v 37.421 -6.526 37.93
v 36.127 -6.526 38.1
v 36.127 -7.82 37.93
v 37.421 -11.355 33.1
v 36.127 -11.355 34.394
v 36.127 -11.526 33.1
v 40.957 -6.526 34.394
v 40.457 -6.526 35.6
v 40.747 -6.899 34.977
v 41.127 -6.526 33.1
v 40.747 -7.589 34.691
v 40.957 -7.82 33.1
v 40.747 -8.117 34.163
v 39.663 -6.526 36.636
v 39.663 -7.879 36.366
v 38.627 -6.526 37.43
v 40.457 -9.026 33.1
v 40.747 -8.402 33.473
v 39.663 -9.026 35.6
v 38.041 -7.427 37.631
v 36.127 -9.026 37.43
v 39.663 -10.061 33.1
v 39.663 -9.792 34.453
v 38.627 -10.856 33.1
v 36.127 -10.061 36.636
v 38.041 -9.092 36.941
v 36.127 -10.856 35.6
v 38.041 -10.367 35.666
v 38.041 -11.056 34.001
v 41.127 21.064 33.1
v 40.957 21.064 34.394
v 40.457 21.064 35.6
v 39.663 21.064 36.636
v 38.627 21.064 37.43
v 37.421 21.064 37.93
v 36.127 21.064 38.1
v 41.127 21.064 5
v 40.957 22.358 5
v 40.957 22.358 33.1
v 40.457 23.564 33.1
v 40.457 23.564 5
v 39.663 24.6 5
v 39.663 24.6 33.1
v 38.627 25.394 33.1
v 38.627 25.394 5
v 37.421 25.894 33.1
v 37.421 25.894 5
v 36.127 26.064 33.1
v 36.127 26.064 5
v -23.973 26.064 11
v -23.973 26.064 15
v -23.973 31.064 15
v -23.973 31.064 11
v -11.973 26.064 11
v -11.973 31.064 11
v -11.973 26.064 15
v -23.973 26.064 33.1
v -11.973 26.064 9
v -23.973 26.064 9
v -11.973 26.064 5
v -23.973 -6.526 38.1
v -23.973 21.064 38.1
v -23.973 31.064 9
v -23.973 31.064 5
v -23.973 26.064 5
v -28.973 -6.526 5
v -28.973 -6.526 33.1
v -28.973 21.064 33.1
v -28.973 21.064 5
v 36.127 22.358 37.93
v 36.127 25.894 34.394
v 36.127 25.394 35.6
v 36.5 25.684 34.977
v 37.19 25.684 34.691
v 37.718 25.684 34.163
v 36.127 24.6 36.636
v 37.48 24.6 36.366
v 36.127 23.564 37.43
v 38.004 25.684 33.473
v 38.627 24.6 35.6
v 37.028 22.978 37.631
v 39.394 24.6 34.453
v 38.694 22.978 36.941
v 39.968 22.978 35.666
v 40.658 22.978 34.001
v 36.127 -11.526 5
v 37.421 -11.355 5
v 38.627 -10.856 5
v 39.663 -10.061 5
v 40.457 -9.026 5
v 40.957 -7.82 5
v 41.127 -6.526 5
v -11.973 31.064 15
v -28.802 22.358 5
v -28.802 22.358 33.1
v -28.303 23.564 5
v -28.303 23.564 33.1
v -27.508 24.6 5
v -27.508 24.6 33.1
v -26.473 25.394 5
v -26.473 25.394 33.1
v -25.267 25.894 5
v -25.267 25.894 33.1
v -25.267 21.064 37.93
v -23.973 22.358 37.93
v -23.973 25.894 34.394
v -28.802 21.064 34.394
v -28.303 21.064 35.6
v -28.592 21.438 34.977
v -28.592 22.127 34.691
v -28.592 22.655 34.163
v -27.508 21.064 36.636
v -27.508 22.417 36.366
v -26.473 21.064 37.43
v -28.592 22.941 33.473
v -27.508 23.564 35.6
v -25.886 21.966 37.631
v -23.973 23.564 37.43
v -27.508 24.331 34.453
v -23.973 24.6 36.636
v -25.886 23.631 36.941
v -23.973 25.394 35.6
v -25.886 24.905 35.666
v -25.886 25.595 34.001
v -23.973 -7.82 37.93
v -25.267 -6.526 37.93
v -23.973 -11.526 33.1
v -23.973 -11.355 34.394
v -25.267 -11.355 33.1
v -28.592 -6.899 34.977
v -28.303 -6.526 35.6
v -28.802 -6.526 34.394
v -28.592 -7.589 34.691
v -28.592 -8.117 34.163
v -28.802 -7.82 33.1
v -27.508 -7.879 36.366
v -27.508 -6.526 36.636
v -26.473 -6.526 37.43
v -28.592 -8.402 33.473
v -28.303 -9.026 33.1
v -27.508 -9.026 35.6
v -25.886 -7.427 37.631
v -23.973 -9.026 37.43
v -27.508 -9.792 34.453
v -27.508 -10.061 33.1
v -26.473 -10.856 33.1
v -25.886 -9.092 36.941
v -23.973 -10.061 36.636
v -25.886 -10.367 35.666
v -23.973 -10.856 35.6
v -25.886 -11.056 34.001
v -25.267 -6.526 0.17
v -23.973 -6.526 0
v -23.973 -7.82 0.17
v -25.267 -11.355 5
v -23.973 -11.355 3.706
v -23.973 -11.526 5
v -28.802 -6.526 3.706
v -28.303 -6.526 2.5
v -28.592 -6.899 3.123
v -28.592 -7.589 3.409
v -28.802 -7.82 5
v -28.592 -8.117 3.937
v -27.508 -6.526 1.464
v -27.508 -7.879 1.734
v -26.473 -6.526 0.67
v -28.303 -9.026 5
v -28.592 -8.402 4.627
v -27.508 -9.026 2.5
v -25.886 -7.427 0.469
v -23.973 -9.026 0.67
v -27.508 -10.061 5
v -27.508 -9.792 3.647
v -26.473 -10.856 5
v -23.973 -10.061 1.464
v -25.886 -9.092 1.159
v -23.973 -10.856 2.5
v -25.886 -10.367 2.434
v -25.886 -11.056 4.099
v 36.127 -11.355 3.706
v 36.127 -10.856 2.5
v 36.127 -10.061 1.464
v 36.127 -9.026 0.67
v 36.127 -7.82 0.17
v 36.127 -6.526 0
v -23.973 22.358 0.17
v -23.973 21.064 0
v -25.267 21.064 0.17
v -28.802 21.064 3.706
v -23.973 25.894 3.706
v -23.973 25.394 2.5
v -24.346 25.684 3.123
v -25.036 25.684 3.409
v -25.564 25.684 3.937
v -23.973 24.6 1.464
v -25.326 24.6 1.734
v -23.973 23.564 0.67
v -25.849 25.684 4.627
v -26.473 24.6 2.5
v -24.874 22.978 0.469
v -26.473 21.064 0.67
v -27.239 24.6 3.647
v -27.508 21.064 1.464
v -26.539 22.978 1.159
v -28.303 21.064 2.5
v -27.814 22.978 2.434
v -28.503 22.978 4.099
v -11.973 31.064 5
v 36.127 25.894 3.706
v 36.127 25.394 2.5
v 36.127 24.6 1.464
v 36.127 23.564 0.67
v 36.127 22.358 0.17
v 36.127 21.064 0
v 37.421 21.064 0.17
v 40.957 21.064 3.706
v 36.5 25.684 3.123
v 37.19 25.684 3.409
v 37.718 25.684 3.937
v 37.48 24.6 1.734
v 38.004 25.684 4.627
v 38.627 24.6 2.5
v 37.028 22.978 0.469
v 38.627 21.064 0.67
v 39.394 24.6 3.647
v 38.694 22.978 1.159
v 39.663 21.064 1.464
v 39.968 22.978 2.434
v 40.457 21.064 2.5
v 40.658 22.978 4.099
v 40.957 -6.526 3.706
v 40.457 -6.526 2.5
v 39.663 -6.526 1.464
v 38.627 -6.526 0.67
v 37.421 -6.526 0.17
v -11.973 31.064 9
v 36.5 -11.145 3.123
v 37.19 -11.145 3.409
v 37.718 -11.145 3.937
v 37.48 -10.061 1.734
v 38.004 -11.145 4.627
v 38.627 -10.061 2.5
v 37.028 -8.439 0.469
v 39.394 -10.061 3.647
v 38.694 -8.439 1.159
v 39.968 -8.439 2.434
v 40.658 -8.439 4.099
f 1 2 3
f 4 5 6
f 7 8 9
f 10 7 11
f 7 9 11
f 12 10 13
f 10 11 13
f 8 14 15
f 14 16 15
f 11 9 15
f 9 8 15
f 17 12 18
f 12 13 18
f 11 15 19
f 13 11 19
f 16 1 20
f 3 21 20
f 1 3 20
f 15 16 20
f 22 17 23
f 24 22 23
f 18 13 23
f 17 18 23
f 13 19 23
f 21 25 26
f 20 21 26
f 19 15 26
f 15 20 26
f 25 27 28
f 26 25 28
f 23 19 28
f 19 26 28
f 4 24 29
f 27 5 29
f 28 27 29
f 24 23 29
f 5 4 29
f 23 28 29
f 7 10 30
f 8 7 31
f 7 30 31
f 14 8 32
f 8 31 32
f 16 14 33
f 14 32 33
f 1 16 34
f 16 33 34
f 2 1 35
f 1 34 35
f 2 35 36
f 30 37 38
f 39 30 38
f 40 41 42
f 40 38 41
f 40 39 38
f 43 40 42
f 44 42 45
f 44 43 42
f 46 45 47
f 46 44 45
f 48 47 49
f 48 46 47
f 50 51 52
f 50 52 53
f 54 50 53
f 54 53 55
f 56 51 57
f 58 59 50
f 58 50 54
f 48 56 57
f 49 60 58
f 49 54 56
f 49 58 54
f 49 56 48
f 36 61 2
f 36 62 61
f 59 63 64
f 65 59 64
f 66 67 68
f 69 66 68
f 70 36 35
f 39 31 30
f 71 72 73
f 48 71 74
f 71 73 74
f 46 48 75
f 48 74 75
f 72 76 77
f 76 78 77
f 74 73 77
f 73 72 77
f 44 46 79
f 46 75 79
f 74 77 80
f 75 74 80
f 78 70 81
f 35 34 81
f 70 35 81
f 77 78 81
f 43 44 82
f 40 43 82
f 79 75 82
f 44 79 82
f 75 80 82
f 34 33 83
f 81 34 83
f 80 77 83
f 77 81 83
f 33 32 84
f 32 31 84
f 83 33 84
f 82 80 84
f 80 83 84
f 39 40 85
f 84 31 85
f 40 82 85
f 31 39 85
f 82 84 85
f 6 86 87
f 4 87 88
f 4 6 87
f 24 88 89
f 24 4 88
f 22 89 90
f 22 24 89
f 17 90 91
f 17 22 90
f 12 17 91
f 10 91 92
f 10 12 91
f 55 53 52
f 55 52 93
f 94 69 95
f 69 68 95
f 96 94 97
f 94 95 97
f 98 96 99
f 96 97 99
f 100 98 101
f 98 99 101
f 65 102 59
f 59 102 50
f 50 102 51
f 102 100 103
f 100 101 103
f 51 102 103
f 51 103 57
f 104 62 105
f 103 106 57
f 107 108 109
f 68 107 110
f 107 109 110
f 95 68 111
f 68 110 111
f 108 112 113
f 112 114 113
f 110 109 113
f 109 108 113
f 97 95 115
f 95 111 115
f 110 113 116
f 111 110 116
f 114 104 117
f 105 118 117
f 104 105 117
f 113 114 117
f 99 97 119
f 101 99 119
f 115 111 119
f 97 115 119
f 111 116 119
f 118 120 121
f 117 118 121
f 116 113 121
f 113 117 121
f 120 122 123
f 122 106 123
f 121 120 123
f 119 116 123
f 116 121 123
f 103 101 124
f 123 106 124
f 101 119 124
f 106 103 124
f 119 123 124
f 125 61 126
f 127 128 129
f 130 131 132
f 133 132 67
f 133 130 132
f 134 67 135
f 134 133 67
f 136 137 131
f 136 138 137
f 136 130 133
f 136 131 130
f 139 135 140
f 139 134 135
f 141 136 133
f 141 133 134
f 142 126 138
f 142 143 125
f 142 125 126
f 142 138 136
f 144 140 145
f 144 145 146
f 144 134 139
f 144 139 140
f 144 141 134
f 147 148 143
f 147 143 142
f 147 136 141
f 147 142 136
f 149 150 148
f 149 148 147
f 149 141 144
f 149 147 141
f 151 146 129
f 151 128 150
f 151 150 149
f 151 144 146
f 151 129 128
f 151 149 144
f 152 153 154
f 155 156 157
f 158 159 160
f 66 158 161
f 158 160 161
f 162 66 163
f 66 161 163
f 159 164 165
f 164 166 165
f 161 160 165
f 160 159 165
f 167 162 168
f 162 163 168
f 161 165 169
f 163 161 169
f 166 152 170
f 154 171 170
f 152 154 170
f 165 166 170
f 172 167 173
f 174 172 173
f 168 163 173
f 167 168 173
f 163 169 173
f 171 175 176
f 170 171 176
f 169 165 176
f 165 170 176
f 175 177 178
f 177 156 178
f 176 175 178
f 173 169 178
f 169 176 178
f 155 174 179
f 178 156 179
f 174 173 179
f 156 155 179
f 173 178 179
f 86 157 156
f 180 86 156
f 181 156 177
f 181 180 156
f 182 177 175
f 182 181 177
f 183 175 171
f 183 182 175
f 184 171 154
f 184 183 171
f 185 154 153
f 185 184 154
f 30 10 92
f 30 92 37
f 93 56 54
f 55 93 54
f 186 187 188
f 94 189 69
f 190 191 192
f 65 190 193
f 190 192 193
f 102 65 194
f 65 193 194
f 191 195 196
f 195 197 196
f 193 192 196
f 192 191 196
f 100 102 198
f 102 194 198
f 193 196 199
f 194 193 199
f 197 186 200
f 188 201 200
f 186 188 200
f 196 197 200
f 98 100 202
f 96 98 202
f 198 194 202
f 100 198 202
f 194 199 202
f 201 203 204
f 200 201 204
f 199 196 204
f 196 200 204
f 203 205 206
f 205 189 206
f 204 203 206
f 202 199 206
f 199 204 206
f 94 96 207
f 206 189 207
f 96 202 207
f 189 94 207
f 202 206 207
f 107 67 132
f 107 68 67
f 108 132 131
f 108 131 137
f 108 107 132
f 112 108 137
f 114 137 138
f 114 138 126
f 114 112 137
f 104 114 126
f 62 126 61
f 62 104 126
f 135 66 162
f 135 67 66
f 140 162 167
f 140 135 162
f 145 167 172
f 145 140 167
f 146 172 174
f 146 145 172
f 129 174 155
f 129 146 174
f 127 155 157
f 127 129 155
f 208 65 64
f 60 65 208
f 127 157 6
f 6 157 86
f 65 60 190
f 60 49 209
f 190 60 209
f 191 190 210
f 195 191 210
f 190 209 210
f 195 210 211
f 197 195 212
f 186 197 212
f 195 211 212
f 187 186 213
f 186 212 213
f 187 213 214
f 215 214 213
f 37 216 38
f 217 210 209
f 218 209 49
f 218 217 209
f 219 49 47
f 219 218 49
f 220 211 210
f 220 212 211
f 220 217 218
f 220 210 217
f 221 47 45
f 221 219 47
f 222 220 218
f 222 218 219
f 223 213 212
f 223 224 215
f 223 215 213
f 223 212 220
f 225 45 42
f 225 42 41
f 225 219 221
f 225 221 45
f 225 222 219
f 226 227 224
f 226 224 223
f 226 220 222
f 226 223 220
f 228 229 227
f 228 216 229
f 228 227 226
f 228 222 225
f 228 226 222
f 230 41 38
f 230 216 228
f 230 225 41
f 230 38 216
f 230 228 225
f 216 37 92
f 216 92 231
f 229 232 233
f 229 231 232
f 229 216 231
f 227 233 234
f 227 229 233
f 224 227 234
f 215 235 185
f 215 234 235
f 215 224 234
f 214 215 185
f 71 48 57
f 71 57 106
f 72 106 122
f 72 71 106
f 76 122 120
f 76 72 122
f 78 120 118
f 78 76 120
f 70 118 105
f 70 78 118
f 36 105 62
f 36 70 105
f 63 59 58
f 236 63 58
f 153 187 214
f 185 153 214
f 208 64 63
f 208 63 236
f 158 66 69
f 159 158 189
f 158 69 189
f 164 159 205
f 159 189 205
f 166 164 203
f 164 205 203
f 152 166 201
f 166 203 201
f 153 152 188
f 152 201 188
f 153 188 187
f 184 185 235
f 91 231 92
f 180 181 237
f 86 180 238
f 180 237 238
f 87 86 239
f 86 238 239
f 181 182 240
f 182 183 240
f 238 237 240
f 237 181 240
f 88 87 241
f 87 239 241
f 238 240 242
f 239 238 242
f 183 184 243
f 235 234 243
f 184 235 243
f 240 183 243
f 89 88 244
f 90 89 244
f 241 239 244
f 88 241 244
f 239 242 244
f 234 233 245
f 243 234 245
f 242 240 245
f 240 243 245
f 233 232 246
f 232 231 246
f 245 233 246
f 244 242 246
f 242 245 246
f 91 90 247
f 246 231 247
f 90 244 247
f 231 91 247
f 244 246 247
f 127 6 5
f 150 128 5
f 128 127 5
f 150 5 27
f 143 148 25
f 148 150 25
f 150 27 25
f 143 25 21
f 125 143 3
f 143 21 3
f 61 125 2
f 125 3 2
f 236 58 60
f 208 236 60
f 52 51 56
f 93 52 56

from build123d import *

# Parameters (mm, degrees)
SKETCH1_W           = 70.1
SKETCH1_H           = 37.59
BOSS_EXTRUDE1_DEPTH = 38.1
FILLET1_R           = 5
SKETCH2_W           = 12
SKETCH2_H           = 4
BOSS_EXTRUDE2_DEPTH = 5


with BuildPart() as part:
    # Sketch1 → Boss-Extrude1 (new body)
    with BuildSketch(Plane.XY):
        with Locations((6.077190332, 7.269320242)):
            Rectangle(SKETCH1_W, SKETCH1_H)
    extrude(amount=BOSS_EXTRUDE1_DEPTH)

    # Fillet1
    fillet1_edges = [part.edges().sort_by_distance(p)[0] for p in [
        (6.077190332, -11.525679758, 38.1),
        (41.127190332, 7.269320242, 38.1),
        (6.077190332, 26.064320242, 38.1),
        (41.127190332, 7.269320242, 0),
        (6.077190332, -11.525679758, 0),
        (-28.972809668, 7.269320242, 0),
        (6.077190332, 26.064320242, 0),
        (-28.972809668, 7.269320242, 38.1),
        (41.127190332, 26.064320242, 19.05),
        (41.127190332, -11.525679758, 19.05),
        (-28.972809668, -11.525679758, 19.05),
        (-28.972809668, 26.064320242, 19.05),
    ]]
    fillet(fillet1_edges, radius=FILLET1_R)

    # Sketch2 → Boss-Extrude2 (add)
    with BuildSketch(Plane(origin=(0, 26.064320242, 0), x_dir=(1, 0, 0), z_dir=(0, 1, 0))):
        with Locations((-17.972809668, -13)):
            Rectangle(SKETCH2_W, SKETCH2_H)
        with Locations((-17.972809668, -7)):
            Rectangle(SKETCH2_W, SKETCH2_H)
    extrude(amount=BOSS_EXTRUDE2_DEPTH)


solid = part.part
